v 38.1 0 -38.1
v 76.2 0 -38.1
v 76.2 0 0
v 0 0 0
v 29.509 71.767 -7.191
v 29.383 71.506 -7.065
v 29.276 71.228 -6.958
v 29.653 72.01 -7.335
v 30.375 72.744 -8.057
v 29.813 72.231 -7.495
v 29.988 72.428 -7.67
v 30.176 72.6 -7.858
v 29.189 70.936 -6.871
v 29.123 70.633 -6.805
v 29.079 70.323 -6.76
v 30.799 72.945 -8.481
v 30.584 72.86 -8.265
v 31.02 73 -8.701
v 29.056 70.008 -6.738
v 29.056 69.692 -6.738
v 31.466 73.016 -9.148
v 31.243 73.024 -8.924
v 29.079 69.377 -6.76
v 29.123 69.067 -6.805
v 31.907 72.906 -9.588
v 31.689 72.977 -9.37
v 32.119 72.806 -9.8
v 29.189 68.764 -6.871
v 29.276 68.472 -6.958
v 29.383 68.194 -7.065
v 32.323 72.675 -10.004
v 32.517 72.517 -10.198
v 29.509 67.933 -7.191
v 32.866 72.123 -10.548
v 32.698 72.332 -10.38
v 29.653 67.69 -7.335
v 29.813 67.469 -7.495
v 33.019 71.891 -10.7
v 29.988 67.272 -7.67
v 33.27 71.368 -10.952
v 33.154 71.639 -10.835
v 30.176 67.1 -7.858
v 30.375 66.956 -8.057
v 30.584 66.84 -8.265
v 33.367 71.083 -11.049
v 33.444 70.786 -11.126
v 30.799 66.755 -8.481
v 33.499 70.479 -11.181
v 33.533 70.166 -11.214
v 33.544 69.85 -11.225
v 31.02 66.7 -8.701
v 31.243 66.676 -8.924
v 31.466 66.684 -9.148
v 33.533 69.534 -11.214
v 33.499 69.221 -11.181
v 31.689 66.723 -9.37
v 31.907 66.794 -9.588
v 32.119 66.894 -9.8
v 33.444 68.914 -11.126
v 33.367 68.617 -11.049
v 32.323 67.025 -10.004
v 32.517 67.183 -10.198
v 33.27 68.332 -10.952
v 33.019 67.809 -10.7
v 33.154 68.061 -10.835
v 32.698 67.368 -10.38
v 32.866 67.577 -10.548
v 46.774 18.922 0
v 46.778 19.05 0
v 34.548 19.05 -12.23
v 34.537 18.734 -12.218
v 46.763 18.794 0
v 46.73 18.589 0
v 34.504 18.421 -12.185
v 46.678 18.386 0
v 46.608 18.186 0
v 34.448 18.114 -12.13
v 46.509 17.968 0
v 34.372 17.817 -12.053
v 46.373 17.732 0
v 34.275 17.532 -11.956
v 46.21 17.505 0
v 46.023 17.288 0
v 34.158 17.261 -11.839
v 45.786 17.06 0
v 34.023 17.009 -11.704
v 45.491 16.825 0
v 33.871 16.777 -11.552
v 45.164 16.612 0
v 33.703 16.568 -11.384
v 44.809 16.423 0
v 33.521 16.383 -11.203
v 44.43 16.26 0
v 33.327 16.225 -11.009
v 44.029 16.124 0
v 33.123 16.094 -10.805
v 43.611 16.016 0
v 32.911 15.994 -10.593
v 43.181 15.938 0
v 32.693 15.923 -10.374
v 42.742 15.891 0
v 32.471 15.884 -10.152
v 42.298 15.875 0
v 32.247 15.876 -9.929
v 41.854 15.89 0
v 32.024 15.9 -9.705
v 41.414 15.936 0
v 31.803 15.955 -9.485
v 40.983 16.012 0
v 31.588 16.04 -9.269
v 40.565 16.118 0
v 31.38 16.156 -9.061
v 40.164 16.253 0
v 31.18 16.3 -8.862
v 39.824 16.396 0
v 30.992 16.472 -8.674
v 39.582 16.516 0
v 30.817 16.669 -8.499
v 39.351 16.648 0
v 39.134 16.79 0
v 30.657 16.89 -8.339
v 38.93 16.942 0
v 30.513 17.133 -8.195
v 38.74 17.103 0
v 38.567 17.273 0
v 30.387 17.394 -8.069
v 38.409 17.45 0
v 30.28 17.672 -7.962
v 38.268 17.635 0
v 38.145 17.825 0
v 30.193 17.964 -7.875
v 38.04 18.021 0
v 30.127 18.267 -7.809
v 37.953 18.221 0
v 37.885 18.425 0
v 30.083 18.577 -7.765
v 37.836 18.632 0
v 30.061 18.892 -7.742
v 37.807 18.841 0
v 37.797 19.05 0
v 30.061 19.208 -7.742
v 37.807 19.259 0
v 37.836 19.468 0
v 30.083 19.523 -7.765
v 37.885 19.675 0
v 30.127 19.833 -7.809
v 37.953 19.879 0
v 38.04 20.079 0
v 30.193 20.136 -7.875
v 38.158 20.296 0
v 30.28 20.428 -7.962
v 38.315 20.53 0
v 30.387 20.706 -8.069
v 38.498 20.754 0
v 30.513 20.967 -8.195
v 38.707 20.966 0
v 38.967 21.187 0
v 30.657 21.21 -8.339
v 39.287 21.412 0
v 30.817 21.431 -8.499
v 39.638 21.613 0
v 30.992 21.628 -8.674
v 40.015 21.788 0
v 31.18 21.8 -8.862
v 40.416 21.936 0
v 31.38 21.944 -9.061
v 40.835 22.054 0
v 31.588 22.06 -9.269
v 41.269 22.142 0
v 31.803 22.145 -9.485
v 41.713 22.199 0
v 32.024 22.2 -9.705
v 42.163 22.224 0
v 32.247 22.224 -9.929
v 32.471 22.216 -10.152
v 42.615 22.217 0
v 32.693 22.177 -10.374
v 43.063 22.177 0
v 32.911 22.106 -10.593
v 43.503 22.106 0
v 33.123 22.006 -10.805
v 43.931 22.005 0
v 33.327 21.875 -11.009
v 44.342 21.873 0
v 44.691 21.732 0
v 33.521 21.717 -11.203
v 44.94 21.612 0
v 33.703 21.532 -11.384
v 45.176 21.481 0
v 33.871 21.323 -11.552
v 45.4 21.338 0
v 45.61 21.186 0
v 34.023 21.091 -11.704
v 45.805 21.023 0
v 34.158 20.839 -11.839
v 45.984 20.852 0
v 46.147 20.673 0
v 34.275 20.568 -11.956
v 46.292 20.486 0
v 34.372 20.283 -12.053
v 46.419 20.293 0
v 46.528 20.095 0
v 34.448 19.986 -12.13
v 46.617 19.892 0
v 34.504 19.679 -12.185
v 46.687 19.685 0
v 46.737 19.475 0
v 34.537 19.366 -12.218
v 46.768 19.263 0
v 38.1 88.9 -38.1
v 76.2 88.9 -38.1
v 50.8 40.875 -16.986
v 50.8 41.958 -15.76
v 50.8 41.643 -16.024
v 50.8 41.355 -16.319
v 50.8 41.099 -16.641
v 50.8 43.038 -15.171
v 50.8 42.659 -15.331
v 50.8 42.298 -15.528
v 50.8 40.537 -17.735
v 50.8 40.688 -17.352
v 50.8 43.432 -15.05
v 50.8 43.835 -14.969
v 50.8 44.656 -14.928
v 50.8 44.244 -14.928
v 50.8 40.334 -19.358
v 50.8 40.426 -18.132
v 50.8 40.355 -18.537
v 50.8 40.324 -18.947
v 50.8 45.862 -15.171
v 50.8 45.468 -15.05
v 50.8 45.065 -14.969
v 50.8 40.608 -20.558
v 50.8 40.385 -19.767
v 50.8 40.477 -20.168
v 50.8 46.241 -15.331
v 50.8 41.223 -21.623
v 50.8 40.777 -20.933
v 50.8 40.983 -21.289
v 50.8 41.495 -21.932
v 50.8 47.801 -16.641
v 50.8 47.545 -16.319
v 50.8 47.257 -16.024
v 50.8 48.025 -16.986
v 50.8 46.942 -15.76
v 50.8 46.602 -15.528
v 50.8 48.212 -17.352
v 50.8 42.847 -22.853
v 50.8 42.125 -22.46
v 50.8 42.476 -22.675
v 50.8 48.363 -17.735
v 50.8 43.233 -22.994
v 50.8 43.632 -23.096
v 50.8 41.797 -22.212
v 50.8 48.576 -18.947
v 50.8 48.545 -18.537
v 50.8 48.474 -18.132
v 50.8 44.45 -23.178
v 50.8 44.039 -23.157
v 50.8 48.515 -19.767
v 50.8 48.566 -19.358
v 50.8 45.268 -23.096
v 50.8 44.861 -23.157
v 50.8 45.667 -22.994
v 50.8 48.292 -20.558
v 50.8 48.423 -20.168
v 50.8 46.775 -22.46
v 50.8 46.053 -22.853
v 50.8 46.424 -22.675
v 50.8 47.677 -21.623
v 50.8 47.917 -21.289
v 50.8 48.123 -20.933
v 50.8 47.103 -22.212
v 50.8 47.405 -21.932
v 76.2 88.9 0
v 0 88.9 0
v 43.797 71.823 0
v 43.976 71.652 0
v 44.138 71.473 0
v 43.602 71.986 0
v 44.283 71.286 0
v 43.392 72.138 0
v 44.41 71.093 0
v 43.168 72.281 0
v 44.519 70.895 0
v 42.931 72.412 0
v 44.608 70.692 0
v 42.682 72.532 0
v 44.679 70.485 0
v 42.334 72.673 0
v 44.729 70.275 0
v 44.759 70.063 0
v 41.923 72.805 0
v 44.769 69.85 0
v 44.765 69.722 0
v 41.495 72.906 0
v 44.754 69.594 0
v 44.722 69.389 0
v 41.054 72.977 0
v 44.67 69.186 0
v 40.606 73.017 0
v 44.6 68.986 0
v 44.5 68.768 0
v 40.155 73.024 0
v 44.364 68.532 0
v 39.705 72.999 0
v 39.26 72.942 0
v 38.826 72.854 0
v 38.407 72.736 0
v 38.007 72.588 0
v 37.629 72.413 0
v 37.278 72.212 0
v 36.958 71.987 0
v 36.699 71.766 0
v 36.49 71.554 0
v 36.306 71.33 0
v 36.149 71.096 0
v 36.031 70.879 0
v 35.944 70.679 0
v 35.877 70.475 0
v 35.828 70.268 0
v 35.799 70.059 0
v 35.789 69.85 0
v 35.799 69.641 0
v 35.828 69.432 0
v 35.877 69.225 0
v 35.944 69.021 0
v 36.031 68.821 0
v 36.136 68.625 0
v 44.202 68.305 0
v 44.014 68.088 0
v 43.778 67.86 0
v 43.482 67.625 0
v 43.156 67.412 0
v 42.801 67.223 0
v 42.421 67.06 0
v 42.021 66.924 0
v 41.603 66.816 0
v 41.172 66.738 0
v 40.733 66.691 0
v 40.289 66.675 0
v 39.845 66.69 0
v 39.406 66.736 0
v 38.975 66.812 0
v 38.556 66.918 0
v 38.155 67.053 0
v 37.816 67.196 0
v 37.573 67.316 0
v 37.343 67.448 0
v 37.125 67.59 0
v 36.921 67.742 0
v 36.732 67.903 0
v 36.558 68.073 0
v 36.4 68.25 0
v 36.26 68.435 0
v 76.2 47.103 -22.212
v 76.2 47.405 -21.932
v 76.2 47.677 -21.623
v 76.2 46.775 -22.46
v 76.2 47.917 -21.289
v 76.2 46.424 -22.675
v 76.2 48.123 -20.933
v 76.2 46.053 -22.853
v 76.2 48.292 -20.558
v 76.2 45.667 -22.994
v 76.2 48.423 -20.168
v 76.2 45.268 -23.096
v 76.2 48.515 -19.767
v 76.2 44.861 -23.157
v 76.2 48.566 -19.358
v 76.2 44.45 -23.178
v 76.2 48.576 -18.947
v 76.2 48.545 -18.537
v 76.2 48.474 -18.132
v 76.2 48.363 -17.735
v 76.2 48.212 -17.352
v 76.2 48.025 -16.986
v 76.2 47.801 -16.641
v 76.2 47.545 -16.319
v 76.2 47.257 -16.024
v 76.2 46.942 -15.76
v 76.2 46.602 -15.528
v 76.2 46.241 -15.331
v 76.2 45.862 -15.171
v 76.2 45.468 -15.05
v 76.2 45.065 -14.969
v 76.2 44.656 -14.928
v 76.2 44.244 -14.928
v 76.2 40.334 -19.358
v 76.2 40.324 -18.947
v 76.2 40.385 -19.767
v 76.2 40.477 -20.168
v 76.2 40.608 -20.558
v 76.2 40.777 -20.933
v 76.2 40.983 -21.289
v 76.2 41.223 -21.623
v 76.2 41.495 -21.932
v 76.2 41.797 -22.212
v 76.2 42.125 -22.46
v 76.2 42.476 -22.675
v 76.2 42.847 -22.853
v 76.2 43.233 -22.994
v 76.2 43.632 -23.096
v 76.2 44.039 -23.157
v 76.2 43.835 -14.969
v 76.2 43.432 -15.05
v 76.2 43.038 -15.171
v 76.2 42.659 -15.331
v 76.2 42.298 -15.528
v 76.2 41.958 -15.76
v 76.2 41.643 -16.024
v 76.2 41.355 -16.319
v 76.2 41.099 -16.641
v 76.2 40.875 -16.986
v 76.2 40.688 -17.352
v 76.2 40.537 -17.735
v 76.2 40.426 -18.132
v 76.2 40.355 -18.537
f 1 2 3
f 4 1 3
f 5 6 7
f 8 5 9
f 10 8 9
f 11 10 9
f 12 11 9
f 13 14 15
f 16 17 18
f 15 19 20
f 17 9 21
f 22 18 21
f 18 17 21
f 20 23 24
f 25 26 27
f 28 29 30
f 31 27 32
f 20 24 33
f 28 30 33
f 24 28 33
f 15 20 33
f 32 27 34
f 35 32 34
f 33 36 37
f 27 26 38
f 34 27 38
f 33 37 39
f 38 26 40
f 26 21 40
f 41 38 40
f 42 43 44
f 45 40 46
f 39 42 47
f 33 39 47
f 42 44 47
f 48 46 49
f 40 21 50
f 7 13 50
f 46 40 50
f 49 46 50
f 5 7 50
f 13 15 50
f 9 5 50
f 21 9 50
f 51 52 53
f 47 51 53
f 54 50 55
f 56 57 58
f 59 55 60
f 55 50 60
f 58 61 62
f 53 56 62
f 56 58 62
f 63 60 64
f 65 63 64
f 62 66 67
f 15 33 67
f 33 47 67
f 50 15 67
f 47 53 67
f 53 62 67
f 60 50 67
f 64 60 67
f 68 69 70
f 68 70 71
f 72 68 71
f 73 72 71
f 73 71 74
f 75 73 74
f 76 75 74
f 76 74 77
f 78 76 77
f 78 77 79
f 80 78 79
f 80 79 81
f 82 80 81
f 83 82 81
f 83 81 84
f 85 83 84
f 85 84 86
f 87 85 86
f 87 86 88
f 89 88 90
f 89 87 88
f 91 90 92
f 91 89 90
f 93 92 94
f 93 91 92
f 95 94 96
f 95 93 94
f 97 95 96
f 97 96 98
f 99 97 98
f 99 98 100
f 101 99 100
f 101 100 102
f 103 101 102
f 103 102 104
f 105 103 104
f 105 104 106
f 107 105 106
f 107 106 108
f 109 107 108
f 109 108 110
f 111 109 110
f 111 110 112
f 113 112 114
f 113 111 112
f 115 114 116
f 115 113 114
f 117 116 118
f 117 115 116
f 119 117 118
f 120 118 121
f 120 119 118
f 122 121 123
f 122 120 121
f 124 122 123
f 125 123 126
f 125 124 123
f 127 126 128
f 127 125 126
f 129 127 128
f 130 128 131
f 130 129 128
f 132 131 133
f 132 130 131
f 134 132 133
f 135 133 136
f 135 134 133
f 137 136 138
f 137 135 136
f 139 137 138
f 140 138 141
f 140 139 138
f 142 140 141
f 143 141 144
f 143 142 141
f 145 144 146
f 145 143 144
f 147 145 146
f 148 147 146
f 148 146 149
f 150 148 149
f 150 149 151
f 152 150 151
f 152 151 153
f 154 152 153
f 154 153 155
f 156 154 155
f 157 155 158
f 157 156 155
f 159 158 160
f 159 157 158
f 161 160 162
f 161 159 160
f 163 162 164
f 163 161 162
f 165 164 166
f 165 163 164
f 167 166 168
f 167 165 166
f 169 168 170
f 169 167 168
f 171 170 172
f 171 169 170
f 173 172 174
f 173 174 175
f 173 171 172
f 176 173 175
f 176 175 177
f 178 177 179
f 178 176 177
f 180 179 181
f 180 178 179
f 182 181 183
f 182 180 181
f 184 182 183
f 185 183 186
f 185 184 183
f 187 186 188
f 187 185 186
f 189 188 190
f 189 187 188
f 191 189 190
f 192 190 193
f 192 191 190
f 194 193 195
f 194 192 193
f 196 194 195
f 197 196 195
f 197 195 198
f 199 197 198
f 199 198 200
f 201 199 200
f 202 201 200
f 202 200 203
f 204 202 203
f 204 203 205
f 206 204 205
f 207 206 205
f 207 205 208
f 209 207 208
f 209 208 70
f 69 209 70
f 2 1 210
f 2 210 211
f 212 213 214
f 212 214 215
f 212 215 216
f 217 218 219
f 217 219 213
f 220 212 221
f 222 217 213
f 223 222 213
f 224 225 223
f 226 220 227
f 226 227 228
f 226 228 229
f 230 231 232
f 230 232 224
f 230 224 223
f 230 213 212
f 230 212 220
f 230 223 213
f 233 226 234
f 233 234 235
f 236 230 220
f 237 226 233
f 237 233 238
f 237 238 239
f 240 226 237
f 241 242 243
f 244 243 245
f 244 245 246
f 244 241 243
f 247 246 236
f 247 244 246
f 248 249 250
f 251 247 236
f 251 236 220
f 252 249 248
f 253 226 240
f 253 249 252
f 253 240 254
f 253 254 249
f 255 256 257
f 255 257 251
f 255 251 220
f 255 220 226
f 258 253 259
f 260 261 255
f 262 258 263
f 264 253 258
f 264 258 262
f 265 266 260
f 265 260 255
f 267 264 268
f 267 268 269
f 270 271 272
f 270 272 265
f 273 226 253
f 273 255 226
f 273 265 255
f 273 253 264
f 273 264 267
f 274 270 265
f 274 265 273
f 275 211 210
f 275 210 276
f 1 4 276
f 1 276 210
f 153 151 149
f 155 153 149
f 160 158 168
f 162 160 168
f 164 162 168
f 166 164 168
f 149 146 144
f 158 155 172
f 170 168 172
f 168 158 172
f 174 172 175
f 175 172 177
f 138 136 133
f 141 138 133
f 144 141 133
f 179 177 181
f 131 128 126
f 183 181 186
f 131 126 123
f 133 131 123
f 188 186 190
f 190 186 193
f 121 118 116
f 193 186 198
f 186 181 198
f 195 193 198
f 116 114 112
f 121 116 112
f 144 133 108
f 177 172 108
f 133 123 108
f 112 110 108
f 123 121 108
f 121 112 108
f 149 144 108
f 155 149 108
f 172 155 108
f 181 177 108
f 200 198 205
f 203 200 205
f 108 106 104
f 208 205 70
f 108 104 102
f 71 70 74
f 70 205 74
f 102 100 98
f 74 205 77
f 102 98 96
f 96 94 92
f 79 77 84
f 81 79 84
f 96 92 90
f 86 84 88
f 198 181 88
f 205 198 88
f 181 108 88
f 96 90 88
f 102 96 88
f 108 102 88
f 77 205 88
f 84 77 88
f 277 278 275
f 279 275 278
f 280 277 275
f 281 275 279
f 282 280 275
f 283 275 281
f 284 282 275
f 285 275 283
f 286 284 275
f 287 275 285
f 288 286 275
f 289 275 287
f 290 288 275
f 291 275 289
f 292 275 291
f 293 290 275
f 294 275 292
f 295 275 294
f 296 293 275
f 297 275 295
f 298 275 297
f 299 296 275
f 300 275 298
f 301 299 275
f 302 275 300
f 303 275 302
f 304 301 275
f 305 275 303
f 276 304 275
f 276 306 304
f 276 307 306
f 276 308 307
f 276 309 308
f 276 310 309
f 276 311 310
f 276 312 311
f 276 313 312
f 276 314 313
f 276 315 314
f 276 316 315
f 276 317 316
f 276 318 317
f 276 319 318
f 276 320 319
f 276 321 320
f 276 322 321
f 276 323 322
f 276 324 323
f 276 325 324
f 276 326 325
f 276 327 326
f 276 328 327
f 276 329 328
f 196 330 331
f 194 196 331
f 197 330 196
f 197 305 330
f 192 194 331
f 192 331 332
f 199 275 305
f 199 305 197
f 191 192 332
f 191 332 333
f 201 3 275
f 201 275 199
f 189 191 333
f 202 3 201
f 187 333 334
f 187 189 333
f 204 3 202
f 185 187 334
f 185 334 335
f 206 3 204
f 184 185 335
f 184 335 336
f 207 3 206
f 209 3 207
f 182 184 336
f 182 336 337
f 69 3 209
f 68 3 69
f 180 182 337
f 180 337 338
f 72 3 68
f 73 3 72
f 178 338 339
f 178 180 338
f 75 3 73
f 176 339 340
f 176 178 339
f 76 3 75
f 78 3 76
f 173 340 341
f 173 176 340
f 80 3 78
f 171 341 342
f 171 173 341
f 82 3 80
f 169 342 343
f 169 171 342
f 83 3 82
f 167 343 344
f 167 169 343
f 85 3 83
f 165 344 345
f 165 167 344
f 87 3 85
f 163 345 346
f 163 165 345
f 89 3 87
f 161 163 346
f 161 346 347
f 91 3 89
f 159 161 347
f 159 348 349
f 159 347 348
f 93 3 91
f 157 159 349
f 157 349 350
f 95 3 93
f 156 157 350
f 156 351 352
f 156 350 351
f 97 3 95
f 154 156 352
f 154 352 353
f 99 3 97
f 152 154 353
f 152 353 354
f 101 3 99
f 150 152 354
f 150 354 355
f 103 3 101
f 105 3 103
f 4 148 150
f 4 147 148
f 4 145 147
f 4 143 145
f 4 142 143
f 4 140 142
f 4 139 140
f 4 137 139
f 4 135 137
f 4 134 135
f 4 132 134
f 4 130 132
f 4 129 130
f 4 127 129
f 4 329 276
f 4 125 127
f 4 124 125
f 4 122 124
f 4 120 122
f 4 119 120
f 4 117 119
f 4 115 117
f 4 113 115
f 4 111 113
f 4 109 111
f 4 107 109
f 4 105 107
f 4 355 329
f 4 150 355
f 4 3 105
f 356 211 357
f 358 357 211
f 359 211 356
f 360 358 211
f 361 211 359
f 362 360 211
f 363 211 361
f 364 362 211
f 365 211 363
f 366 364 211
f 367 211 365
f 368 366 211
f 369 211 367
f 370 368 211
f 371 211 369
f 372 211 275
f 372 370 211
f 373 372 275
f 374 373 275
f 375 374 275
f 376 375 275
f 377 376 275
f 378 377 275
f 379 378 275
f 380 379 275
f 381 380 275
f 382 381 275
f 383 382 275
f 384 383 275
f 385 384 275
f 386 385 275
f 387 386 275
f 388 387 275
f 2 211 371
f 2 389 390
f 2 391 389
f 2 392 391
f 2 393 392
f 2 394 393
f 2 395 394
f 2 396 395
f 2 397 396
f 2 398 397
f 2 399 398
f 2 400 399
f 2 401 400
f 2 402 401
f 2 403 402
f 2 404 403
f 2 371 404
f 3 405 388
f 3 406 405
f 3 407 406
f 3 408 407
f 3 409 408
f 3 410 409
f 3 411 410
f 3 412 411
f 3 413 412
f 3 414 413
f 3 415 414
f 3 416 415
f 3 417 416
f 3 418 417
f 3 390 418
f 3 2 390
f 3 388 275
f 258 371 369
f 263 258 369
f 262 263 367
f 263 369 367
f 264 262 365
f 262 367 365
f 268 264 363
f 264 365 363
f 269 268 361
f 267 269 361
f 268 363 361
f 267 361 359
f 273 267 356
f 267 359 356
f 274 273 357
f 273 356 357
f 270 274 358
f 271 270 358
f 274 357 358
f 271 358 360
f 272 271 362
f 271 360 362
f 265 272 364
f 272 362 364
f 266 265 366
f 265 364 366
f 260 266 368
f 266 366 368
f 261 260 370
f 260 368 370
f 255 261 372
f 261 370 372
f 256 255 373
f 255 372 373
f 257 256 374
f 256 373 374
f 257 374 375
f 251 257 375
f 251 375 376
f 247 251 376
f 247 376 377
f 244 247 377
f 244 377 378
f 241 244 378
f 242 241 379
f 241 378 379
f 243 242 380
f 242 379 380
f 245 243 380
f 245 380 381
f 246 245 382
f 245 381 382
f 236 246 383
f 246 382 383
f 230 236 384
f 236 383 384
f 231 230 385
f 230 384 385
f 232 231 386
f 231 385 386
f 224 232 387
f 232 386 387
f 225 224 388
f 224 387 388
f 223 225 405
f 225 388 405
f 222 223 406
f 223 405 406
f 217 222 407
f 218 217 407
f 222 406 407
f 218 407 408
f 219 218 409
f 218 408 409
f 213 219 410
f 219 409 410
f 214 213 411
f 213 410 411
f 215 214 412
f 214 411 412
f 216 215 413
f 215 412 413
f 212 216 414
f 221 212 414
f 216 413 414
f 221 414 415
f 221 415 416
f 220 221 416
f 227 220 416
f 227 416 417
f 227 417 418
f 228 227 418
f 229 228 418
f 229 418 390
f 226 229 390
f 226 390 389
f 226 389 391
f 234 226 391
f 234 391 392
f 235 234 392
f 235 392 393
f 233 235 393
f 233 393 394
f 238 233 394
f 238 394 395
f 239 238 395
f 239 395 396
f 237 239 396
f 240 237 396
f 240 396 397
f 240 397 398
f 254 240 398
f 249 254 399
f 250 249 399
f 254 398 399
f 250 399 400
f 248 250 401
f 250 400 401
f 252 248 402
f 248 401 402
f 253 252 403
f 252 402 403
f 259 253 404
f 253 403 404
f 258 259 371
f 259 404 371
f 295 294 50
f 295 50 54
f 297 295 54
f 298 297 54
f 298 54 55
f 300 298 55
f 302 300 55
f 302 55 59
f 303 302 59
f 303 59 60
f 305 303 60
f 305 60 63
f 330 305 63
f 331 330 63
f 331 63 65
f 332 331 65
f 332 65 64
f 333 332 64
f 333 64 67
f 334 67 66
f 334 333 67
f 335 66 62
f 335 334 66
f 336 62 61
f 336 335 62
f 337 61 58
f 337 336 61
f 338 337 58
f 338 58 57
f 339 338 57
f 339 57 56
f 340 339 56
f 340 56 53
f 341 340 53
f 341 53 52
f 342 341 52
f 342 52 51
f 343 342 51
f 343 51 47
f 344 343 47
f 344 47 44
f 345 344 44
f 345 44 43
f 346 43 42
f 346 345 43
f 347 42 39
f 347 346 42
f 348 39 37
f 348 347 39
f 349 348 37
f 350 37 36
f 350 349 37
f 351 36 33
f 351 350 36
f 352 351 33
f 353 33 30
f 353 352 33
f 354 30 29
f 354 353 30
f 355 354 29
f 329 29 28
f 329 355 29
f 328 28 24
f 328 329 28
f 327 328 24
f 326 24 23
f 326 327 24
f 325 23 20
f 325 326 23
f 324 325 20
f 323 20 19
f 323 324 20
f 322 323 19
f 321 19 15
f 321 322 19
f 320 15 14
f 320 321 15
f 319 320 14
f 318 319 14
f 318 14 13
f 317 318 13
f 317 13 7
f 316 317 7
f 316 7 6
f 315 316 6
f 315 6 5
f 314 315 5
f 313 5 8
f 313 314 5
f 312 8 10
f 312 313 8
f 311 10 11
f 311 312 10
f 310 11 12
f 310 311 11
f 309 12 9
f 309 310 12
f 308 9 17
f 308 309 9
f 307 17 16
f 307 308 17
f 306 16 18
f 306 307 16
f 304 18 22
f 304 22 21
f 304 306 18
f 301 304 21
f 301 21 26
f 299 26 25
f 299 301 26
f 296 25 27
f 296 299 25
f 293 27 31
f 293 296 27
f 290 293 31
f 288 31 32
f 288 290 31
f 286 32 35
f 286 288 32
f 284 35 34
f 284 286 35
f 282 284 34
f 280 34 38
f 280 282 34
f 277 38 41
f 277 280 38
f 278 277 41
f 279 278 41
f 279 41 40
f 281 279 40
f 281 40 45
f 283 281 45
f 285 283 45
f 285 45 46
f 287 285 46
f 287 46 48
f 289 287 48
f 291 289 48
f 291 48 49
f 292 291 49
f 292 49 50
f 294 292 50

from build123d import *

# Parameters (mm, degrees)
BOSS_EXTRUDE1_DEPTH = 88.9
SKETCH2_R           = 3.175
CUT_EXTRUDE1_DEPTH  = 38.1
SKETCH3_R           = 4.1275
CUT_EXTRUDE2_DEPTH  = 25.4


with BuildPart() as part:
    # Sketch1 → Boss-Extrude1 (new body)
    with BuildSketch(Plane(origin=(0, 0, 0), x_dir=(1, 0, 0), z_dir=(0, 1, 0))):
        Polygon((0, 0), (38.1, 38.1), (76.2, 38.1), (76.2, 0), align=None)
    extrude(amount=BOSS_EXTRUDE1_DEPTH)

    # Sketch2 → Cut-Extrude1 (cut)
    with BuildSketch(Plane(origin=(38.1, 0, 38.1), x_dir=(-0.7071067811865464, 0, 0.7071067811865488), z_dir=(-0.7071067811865488, 0, -0.7071067811865464))):
        with Locations(Location((-28.481536726, 69.85, 0), (0, 0, 180))):
            Circle(SKETCH2_R)
        with Locations(Location((-29.901764766, 19.05, 0), (0, 0, 180))):
            Circle(SKETCH2_R)
    extrude(amount=CUT_EXTRUDE1_DEPTH, mode=Mode.SUBTRACT)

    # Sketch3 → Cut-Extrude2 (cut)
    with BuildSketch(Plane(origin=(76.2, 0, 0), x_dir=(0, 0, -1), z_dir=(1, 0, 0))):
        with Locations((19.05, 44.45)):
            Circle(SKETCH3_R)
    extrude(amount=-CUT_EXTRUDE2_DEPTH, mode=Mode.SUBTRACT)


solid = part.part
